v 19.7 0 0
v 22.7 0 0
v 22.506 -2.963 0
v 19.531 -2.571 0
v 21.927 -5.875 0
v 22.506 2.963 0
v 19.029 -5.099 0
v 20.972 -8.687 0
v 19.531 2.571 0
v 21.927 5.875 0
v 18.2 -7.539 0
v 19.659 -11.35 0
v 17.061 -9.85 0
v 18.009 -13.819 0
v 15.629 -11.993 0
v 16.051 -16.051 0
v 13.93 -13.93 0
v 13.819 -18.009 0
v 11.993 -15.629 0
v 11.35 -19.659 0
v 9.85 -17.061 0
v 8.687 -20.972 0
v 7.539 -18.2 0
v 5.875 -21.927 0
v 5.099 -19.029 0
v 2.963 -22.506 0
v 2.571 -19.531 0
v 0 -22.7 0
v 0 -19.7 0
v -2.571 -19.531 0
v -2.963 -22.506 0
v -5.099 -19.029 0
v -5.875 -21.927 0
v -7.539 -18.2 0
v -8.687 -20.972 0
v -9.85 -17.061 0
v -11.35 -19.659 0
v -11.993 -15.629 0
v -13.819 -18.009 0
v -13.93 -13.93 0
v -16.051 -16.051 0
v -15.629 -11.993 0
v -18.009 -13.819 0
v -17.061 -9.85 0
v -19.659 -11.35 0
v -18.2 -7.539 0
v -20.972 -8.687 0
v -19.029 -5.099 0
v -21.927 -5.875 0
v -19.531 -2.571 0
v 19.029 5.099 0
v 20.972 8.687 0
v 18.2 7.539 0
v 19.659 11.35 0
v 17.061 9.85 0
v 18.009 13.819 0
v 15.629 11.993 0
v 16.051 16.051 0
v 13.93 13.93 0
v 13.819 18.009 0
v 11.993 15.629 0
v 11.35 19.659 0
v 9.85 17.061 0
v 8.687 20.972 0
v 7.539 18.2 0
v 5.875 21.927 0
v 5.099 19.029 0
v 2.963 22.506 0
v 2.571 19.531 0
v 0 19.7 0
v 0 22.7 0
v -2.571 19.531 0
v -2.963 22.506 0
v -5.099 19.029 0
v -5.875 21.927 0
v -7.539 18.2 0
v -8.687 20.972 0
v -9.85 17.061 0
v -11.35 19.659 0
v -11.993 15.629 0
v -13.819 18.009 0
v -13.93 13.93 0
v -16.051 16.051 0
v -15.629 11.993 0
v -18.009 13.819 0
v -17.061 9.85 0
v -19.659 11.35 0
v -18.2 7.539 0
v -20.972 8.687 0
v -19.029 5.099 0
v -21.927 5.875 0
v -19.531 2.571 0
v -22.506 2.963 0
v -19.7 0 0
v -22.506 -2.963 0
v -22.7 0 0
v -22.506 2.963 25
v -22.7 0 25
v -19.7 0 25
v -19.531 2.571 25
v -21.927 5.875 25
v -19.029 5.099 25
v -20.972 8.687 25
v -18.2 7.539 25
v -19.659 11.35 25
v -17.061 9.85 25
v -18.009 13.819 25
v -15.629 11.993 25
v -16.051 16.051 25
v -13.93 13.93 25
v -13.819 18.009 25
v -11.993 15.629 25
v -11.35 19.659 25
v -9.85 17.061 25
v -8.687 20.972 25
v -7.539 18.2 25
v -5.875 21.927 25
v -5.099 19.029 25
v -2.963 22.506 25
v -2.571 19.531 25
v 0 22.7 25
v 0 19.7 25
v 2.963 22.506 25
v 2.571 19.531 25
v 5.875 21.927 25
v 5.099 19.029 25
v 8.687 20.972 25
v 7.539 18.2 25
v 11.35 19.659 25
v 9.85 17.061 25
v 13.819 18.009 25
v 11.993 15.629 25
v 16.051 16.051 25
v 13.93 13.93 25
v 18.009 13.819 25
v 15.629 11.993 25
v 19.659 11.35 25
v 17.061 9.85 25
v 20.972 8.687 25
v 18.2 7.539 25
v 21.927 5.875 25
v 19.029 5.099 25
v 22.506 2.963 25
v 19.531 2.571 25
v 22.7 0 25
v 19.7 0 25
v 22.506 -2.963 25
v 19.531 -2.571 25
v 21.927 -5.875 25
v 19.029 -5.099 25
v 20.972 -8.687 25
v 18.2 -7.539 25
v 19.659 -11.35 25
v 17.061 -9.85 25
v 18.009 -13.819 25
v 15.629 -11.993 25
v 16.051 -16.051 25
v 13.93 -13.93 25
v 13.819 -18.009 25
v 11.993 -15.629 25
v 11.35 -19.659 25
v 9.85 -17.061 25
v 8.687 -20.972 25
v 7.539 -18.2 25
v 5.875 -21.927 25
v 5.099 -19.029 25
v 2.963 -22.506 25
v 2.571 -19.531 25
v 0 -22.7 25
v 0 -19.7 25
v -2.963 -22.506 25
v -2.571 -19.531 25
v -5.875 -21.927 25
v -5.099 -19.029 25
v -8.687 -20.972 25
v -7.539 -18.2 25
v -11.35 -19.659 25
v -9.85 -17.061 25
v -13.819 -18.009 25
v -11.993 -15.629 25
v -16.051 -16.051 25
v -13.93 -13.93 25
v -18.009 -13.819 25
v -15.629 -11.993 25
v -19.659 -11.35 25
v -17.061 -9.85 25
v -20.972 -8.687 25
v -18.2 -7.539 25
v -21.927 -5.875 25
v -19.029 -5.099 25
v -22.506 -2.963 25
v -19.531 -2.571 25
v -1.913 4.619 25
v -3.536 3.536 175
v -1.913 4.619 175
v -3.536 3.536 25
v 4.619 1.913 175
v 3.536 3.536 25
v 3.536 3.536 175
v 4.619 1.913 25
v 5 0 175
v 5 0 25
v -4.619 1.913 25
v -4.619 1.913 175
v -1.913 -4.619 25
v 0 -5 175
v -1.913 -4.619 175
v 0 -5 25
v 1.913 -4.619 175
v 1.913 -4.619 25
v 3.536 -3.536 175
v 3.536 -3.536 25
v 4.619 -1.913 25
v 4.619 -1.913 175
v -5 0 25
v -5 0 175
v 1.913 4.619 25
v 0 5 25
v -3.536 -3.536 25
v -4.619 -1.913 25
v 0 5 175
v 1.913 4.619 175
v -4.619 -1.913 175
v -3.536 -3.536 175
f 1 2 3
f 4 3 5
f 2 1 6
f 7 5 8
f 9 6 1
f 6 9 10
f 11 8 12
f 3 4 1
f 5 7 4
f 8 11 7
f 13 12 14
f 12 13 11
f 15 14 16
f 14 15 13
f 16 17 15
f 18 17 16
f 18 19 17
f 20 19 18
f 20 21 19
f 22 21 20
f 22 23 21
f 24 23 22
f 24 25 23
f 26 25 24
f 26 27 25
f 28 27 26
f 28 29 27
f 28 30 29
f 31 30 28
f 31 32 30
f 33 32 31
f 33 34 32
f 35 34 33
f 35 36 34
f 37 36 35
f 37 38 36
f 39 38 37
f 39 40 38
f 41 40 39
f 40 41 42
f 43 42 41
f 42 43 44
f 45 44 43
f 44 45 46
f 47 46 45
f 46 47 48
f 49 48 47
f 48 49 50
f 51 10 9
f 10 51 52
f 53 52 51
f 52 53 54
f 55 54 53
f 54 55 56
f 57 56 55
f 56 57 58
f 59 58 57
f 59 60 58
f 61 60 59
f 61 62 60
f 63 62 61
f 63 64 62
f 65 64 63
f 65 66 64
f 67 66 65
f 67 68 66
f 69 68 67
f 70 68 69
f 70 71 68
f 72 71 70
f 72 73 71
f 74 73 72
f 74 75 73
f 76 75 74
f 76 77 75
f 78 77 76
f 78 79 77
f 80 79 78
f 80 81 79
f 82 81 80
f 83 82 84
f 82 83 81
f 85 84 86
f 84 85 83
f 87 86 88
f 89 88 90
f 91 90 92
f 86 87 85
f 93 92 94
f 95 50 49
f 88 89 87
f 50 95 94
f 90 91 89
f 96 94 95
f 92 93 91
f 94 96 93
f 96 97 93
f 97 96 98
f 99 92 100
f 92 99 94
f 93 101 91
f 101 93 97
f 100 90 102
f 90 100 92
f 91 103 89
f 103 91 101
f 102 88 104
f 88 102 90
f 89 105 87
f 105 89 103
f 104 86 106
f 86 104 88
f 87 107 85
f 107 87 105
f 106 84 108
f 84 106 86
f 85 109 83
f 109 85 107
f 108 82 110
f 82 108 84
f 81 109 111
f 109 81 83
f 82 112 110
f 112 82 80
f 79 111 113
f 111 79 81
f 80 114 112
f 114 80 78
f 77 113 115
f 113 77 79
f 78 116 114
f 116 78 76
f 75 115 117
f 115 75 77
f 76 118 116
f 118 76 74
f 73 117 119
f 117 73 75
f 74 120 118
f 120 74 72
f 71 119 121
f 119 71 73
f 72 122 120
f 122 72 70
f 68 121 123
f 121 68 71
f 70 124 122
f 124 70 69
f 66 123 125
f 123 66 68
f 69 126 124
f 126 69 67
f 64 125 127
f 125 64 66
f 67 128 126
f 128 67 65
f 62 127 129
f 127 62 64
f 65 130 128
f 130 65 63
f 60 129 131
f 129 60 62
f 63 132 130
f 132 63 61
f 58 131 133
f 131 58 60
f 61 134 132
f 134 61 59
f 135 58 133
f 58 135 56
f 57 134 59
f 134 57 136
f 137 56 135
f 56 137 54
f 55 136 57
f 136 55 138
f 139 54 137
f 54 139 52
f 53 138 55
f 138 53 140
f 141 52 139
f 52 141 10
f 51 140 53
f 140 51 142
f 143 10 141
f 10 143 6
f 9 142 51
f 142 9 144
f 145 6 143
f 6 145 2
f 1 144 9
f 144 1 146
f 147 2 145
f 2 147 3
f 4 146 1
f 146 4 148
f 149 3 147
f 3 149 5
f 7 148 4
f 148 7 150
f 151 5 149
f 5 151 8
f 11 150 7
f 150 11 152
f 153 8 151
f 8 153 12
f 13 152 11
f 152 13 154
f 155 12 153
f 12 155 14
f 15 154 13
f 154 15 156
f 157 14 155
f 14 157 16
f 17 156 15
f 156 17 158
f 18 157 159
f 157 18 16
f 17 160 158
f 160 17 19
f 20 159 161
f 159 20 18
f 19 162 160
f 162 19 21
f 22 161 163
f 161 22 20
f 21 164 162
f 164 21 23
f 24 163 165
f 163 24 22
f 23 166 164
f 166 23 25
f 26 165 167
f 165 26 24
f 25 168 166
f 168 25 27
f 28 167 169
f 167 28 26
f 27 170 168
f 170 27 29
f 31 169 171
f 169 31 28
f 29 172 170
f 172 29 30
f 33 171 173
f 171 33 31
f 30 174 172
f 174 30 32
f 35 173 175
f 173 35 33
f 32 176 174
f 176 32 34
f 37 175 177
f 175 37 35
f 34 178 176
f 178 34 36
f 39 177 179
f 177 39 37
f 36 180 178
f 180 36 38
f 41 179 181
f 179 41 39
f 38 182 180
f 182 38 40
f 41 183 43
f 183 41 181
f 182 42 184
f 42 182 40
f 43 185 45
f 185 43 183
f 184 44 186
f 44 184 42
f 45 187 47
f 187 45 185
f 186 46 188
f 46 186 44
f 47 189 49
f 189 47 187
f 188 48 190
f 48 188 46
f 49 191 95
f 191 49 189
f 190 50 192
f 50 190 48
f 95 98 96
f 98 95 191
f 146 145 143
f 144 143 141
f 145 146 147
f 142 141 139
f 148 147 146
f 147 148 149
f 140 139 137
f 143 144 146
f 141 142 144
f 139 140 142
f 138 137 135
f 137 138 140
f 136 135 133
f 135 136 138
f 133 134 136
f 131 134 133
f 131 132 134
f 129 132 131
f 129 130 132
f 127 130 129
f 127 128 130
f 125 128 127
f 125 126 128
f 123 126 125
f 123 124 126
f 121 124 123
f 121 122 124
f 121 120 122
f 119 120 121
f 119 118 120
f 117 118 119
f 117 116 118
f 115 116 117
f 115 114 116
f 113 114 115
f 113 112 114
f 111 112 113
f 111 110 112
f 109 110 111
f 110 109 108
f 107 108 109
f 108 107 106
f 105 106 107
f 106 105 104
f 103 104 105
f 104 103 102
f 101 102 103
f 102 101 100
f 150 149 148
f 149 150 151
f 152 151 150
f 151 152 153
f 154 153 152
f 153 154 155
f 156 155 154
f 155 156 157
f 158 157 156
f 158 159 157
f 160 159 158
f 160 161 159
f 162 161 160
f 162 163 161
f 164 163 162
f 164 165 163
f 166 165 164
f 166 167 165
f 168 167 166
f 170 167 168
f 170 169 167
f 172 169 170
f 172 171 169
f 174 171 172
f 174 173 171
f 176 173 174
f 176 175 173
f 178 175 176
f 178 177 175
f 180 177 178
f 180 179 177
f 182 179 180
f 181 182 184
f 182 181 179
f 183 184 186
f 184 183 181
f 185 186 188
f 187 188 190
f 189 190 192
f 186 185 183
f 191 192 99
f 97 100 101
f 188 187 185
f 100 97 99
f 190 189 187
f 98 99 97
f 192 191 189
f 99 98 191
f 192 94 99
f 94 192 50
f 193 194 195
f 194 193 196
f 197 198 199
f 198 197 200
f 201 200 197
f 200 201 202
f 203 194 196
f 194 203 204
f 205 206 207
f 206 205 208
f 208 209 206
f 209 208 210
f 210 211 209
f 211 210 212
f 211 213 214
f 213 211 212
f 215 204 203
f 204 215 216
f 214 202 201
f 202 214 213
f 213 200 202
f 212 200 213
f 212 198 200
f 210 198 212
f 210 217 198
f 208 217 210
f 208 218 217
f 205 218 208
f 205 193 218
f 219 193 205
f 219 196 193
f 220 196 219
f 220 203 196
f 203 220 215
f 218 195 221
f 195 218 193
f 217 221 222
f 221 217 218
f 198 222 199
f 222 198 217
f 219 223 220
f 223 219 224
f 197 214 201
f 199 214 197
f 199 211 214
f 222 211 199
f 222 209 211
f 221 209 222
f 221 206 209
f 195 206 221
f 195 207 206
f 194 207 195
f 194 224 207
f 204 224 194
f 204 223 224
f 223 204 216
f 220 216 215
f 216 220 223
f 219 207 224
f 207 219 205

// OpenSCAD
// Band-iron hanger for 1" pipe (light-duty loop).
// Band-iron variant of the clevis family; pipe enters at origin.

// @part hanger_band_iron
// @kind hanger
// @category hanger.clevis
// @display-name "Band-Iron Hanger (1\")"
// @mfg anvil
// @mfg-pn Fig-65
// @price-usd 3.10
// @install-minutes 6
// @crew apprentice
// @param pipe_size_in enum[0.75,1,1.25,1.5,2] default=1 label="Pipe Size" unit="in"
// @port pipe position=[0,0,0] direction=[0,0,1] style=none size_in=1 role=branch

pipe_od = 33.4;
band_w = 25;
band_t = 3;
rod_d = 10;
rod_l = 150;
loop_r = pipe_od / 2 + band_t;
// Loop (half-torus approximation)
rotate_extrude($fn = 48)
    translate([loop_r, 0, 0])
        square(size = [band_t, band_w]);
// Threaded rod
translate([0, 0, band_w])
    cylinder(h = rod_l, d = rod_d, $fn = 16);
